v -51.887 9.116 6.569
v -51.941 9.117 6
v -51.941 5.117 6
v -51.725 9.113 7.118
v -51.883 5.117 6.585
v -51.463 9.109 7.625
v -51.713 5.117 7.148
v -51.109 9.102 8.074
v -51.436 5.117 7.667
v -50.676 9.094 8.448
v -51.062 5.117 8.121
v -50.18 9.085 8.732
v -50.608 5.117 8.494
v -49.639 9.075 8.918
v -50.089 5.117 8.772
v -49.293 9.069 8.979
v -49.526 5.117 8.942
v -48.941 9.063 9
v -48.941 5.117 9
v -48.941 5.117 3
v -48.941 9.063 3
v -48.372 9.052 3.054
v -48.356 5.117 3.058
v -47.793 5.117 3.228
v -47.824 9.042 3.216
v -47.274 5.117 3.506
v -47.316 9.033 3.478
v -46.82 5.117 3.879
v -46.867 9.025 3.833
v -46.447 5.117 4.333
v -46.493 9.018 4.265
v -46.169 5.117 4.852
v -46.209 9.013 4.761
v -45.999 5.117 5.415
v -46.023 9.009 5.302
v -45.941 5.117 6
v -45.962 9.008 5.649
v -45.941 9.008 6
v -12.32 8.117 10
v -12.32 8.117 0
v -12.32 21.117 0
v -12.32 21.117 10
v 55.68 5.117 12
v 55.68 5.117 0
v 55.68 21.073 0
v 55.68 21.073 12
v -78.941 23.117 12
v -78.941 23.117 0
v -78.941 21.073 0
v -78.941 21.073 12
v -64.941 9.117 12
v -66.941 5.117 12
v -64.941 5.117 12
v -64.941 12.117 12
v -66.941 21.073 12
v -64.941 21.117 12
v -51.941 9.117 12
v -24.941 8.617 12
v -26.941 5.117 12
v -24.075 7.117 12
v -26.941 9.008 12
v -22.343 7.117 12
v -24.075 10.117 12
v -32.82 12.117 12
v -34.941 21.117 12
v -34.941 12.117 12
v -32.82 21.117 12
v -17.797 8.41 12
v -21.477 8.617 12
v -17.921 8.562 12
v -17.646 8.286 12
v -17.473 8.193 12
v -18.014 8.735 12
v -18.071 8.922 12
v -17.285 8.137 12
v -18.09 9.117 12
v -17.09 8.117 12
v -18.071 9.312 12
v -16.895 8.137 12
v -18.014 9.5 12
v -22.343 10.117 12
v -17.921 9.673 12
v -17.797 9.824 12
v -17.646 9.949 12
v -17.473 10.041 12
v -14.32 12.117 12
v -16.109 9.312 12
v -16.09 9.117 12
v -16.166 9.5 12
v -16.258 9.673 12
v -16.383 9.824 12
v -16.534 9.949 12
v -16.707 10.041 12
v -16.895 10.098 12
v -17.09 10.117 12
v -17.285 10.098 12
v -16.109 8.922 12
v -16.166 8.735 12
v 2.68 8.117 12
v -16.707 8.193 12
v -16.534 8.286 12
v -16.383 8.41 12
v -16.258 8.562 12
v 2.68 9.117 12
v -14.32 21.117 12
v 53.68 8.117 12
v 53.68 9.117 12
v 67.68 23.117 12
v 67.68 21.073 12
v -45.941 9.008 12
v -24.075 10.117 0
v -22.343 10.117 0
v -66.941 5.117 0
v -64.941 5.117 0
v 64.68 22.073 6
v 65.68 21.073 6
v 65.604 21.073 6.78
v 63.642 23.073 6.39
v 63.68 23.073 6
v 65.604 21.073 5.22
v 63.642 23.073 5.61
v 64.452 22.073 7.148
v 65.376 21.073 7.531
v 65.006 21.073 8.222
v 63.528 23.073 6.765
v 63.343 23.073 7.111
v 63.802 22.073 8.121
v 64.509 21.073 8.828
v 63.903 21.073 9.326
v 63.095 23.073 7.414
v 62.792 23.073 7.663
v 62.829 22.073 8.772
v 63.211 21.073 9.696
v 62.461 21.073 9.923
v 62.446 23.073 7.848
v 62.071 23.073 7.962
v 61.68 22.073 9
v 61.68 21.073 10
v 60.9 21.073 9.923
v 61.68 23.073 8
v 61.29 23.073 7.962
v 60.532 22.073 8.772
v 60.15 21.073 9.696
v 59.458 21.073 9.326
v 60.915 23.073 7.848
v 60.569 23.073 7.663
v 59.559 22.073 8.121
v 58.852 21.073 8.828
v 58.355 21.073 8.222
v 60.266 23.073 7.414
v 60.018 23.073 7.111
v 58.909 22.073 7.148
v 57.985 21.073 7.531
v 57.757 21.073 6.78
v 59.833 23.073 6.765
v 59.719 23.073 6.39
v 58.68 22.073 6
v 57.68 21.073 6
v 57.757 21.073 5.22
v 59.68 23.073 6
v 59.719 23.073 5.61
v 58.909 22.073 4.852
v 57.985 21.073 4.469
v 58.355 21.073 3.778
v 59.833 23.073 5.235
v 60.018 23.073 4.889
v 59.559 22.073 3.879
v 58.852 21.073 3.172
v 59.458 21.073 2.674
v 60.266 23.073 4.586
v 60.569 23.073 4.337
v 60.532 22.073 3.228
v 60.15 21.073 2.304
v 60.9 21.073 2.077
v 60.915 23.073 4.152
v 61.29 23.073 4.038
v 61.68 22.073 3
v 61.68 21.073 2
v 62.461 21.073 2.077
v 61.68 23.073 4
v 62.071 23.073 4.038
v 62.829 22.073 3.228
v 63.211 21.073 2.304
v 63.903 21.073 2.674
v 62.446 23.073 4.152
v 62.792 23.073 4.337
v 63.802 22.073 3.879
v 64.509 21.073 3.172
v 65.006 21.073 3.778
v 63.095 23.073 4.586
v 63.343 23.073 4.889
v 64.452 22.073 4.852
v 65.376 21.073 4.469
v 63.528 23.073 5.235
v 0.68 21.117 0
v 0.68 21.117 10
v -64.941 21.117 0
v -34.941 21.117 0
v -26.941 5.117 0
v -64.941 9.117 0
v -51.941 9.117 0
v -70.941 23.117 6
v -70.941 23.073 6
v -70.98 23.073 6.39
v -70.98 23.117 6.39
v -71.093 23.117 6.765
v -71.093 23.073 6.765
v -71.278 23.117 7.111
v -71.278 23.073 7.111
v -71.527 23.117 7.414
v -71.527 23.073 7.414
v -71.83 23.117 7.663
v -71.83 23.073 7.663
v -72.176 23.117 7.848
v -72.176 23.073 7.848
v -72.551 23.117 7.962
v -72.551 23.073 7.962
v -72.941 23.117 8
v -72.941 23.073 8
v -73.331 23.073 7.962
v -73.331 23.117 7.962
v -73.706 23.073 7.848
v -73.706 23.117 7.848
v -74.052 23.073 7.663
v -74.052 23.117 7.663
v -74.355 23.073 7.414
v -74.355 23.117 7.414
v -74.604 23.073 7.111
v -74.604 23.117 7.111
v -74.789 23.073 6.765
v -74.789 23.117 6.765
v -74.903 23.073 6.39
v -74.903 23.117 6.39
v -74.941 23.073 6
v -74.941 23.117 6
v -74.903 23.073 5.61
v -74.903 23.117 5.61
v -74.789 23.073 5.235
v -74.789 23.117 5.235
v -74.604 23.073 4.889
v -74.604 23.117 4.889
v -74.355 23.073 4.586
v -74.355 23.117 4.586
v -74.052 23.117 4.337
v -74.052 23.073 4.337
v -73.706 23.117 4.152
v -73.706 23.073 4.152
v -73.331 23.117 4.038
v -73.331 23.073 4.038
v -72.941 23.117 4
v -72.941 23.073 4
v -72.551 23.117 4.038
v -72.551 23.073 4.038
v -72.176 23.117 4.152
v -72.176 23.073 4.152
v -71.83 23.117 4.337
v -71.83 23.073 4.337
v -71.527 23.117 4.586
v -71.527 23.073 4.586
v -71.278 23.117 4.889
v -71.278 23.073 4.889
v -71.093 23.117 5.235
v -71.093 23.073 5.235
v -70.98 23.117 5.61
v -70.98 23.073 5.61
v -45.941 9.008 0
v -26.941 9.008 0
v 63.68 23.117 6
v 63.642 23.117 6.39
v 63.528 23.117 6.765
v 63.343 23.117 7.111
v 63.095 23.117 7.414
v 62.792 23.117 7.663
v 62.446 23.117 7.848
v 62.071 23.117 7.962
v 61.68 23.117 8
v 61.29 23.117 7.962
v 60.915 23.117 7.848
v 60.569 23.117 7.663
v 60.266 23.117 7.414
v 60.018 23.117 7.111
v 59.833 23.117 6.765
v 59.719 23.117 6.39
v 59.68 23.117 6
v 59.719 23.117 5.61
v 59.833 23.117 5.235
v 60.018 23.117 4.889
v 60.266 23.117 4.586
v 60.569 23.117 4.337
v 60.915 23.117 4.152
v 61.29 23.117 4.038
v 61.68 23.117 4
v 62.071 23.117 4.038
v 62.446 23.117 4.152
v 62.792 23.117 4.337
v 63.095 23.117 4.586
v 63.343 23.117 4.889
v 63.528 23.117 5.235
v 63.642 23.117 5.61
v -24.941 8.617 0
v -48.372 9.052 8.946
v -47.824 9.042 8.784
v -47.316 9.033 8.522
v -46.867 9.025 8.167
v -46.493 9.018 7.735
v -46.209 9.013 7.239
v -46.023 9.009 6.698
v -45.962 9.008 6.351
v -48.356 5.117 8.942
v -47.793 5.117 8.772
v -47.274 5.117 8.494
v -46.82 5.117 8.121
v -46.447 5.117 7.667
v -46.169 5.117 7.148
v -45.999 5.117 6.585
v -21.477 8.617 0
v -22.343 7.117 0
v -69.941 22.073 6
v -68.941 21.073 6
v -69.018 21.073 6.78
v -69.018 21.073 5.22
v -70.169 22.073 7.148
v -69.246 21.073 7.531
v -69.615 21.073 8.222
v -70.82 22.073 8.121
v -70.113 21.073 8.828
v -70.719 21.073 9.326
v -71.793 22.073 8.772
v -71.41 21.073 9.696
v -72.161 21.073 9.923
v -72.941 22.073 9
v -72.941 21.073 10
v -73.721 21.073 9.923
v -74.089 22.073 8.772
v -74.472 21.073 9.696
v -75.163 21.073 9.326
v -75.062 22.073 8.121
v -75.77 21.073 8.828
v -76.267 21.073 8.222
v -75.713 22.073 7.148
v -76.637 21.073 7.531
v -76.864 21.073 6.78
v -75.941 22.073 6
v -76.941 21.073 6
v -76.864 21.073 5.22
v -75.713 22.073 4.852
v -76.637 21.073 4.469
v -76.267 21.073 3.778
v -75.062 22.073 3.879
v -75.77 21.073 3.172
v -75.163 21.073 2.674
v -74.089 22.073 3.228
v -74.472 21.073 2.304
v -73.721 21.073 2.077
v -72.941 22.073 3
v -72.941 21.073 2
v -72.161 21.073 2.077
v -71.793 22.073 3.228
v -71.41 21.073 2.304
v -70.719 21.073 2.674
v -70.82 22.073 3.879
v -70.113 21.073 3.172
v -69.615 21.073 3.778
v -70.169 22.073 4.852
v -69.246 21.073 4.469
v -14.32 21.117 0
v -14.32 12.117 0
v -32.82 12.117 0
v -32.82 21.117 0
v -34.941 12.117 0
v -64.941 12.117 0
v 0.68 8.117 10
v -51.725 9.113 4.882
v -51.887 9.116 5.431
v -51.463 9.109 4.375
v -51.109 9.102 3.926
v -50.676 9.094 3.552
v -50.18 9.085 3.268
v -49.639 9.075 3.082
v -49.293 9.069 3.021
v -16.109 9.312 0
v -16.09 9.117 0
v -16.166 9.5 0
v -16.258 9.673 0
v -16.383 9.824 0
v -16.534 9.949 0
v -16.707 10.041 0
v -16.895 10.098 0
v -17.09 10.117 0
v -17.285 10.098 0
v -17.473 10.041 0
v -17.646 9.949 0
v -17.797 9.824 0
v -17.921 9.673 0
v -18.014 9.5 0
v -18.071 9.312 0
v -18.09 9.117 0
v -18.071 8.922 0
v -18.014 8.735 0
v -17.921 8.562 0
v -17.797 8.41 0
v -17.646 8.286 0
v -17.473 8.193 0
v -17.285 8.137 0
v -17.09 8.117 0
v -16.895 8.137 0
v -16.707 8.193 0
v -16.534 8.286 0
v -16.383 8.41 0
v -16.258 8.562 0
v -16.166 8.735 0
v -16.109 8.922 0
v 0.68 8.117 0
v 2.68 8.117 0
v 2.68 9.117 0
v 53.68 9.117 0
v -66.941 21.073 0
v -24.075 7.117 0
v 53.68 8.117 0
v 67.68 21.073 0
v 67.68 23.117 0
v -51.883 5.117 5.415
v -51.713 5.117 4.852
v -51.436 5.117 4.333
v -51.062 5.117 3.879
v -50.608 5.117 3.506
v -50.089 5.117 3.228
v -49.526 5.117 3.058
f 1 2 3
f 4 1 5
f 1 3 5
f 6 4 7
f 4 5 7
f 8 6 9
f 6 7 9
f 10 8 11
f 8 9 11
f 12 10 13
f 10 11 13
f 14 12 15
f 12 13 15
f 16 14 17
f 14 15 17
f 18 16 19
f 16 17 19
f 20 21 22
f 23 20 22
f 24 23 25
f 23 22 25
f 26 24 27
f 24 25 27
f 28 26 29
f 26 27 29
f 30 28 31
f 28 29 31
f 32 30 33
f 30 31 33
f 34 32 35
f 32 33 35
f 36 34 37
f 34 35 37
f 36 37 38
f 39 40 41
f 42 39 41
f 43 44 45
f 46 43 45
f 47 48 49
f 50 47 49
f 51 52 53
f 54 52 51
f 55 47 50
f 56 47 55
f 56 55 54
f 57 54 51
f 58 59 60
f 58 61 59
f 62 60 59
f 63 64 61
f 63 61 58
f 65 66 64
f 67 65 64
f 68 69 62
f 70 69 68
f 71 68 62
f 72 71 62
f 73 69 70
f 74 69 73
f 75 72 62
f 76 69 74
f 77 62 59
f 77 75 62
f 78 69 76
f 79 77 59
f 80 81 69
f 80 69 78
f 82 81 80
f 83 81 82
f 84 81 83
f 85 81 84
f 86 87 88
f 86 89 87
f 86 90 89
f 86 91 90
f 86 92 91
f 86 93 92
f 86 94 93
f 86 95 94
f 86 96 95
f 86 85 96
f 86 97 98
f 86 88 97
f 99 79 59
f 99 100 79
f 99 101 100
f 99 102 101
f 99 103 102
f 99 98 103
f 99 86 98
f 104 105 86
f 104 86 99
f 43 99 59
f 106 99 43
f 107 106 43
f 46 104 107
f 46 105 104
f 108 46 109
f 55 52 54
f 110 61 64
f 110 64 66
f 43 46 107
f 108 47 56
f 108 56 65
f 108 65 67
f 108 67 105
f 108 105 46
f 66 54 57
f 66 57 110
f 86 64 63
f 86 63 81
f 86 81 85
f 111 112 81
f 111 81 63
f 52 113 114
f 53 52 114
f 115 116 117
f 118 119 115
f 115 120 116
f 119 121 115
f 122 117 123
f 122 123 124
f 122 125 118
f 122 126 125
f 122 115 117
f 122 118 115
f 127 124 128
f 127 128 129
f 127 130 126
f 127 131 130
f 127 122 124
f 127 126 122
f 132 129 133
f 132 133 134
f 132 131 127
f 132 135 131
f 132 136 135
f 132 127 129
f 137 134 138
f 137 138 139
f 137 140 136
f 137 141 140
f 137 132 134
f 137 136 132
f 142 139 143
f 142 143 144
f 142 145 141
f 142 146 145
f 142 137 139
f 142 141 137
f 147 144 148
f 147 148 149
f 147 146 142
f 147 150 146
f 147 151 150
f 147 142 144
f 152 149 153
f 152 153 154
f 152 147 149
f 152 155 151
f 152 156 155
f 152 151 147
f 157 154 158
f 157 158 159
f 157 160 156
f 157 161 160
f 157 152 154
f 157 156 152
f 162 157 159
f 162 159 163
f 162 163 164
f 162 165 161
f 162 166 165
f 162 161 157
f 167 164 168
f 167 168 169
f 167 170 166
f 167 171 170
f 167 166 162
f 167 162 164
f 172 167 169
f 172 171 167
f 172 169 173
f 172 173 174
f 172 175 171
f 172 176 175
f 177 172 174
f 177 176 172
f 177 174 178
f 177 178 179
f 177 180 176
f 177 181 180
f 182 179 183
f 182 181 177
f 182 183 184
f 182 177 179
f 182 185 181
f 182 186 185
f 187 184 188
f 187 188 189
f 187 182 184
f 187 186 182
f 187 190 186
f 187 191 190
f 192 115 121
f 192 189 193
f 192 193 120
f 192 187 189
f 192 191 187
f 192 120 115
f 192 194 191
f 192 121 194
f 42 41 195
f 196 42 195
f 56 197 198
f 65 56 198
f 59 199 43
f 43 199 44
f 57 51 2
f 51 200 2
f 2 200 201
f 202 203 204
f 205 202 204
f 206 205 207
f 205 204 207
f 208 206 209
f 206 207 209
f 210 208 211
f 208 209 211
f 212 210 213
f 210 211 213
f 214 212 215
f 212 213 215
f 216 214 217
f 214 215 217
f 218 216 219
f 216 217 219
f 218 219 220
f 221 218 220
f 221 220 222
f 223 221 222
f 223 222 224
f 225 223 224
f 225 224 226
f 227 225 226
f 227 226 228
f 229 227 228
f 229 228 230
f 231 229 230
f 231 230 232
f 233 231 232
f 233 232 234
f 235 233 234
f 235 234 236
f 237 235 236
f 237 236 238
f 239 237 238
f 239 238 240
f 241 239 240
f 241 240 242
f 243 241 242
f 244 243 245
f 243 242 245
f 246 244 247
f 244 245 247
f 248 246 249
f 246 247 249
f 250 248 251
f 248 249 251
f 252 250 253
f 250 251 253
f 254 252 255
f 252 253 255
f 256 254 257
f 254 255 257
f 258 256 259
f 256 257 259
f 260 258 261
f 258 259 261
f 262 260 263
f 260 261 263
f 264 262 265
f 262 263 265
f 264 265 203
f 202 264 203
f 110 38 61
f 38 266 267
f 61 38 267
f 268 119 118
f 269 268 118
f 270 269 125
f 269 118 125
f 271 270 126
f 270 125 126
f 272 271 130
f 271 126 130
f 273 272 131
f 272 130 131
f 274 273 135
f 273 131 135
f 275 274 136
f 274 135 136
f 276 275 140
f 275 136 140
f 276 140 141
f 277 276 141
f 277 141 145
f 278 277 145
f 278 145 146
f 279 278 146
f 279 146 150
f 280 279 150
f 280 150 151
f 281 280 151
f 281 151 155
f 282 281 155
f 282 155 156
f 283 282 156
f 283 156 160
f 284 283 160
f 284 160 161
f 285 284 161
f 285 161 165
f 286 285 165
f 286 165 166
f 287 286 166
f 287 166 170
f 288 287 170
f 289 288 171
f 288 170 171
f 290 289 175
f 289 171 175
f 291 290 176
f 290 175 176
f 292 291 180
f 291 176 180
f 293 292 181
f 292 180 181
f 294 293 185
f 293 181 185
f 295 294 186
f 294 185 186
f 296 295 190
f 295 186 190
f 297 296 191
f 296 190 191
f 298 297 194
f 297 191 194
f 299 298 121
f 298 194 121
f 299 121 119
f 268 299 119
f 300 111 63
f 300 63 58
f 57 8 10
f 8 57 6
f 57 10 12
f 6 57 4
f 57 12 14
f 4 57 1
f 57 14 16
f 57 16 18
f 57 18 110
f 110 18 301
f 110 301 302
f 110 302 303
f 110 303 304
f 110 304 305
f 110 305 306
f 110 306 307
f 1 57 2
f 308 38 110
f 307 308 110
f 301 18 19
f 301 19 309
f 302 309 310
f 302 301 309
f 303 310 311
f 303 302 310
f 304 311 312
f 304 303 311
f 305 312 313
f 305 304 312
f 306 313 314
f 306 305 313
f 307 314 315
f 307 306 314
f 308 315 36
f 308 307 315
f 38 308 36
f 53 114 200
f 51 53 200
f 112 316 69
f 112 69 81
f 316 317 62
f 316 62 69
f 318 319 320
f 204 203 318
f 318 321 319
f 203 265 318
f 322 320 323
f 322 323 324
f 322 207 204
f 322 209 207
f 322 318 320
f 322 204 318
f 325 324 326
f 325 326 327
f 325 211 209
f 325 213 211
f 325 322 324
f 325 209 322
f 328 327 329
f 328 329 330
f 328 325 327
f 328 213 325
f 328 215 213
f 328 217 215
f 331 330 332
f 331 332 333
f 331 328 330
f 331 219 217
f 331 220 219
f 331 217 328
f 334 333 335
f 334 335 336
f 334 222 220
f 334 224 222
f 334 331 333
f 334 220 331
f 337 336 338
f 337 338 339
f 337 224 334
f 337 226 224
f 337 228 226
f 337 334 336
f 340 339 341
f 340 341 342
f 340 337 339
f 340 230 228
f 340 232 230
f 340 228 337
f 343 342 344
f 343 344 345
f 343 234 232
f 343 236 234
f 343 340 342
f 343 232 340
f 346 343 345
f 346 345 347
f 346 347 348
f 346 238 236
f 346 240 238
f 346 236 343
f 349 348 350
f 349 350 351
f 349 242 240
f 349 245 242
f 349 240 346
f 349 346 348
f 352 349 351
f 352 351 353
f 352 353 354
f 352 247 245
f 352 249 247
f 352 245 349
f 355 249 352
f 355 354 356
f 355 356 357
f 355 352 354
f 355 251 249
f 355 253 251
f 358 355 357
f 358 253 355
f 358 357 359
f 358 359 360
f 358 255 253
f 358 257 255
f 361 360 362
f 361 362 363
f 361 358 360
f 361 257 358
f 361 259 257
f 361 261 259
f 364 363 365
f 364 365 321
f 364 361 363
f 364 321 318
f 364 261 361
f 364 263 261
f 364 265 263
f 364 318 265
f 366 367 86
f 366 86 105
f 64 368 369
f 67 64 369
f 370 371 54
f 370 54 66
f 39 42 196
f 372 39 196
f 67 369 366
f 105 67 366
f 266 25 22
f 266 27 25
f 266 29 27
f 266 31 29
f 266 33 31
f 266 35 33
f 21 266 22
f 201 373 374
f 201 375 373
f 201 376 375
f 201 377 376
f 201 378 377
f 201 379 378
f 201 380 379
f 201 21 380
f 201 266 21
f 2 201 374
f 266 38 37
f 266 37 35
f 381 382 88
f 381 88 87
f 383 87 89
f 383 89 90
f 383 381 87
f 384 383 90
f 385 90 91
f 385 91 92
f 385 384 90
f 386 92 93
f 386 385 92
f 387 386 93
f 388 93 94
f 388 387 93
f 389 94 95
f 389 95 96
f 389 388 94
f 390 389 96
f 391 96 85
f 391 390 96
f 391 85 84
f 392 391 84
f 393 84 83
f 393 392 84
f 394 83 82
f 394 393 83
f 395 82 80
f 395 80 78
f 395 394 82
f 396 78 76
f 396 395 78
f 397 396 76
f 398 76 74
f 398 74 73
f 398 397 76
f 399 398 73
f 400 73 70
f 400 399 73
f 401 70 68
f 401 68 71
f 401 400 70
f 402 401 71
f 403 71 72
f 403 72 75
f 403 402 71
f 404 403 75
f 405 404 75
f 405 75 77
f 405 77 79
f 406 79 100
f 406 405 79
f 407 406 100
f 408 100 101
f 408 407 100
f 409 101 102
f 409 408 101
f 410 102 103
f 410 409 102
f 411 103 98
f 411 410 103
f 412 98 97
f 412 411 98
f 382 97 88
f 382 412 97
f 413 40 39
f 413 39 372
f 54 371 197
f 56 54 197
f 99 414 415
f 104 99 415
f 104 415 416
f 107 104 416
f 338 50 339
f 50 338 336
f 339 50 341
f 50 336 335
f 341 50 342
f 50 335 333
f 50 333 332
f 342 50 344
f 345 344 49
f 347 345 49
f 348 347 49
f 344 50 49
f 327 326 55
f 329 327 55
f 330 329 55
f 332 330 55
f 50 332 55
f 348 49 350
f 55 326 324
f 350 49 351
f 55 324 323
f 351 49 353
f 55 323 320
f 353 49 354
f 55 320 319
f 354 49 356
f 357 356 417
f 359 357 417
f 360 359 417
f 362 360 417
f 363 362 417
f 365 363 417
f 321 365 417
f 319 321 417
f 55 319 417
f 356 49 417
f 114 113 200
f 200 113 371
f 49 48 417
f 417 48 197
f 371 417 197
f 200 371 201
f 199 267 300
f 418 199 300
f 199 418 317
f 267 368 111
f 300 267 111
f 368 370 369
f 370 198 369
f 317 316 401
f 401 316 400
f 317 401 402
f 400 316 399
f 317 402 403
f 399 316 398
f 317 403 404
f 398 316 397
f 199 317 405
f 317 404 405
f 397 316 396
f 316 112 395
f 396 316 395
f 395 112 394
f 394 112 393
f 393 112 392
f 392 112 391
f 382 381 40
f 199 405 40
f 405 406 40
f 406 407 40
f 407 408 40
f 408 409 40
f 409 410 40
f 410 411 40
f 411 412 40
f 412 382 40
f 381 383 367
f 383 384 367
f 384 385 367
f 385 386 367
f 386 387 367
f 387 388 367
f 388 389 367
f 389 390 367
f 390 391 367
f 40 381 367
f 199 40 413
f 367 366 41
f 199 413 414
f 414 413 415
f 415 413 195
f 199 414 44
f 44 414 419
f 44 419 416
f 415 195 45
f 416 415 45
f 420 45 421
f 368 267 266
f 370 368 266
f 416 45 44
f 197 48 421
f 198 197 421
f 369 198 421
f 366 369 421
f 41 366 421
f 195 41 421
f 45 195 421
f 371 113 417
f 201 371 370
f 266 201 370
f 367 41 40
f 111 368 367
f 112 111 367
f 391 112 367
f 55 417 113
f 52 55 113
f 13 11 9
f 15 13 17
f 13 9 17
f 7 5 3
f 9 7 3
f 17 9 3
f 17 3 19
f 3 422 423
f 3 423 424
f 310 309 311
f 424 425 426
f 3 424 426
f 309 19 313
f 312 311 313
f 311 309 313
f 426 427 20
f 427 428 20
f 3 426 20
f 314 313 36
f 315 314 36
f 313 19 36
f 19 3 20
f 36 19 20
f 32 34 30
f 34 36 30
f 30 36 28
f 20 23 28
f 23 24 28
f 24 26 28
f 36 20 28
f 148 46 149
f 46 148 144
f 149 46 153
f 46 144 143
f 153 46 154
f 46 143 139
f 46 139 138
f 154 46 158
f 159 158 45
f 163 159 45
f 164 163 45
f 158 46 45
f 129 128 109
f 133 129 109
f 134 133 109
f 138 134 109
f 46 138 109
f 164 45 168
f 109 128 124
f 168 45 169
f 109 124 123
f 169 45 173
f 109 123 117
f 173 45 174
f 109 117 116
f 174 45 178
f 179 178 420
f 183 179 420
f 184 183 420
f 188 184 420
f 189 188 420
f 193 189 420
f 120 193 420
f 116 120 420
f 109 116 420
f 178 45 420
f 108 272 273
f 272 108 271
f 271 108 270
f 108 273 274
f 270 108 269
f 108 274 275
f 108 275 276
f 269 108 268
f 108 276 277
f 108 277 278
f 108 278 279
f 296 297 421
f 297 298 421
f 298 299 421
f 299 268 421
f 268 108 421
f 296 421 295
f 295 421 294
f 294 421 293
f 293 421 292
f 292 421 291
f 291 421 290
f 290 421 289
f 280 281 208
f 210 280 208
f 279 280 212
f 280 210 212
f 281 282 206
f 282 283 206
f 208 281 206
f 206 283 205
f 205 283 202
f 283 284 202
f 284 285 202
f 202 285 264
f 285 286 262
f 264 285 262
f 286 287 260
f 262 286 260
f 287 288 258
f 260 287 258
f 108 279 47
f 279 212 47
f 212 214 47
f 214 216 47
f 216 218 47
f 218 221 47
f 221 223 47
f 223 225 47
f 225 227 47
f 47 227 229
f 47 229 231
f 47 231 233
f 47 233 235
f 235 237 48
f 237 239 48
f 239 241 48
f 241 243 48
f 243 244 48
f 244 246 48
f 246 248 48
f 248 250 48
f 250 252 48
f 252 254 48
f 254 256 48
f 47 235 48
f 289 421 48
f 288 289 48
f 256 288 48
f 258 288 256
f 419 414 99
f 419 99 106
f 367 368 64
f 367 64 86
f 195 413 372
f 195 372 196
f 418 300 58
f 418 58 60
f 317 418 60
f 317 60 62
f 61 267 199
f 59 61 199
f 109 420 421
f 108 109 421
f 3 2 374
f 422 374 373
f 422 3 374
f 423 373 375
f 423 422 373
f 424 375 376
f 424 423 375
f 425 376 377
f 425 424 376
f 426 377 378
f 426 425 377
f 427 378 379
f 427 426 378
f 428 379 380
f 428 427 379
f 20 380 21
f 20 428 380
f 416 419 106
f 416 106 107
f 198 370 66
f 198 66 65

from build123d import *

# Parameters (mm, degrees)
F7_DEPTH  = 12
F3_W      = 18.5
F3_H      = 9
F5_R      = 1
F2_W      = 30
F2_H      = 9
F0_W      = 51
F0_H      = 1
F8_DEPTH  = 12
F9_DEPTH  = 9
F10_DEPTH = 3
F11_R     = 2.99999
F13_R     = 2
F12_R     = 2
F14_DEPTH = 23.9
F15_SIZE  = 2
F1_W      = 13
F1_H      = 13
F16_DEPTH = 10


# Not quite as in the source:
# - a fillet or chamfer is up to 0.001 mm smaller than in the source, because OpenCascade refuses the exact size


with BuildPart() as f7:
    # F6 (on Top) → F7 (new body)
    with BuildSketch(Plane.XY):
        Polygon((58.3547055721, 23.1172949925), (-78.9411039278, 23.1172949925), (-78.9411039278, 21.0728161037), (-66.9411039278, 21.0728161037), (-66.9411039278, 5.1172949925), (-64.9411039278, 5.1172949925), (-64.9411039278, 9.1172949925), (-51.9411039278, 9.1172949925), (-45.9411039278, 9.0077459167), (-26.9411039278, 9.0077459167), (-26.9411039278, 5.1172949925), (55.6804920286, 5.1172949925), (55.6804920286, 21.0728161037), (67.6804920286, 21.0728161037), (67.6804920286, 23.1172949925), align=None)
    extrude(amount=F7_DEPTH)

    # F4 (on Top) + F3 (on Top) + F5 (on Top) + F2 (on Top) + F0 (on Top) → F8 (cut)
    with BuildSketch(Plane.XY):
        Polygon((-22.3430277164, 7.1172949925), (-21.4770023127, 8.6172949925), (-22.3430277164, 10.1172949925), (-24.075078524, 10.1172949925), (-24.9411039278, 8.6172949925), (-24.075078524, 7.1172949925), align=None)
    with BuildSketch(Plane.XY):
        with Locations((-23.5695079714, 16.6172949925)):
            Rectangle(F3_W, F3_H)
    with BuildSketch(Plane.XY):
        with Locations((-17.0899687546, 9.1172949925)):
            Circle(F5_R)
    with BuildSketch(Plane.XY):
        with Locations((-49.9411039278, 16.6172949925)):
            Rectangle(F2_W, F2_H)
    with BuildSketch(Plane.XY):
        with Locations((28.1804920286, 8.6172949925)):
            Rectangle(F0_W, F0_H)
    extrude(amount=F8_DEPTH, mode=Mode.SUBTRACT)

    # F6 (on Top) → F9 (join)
    with BuildSketch(Plane.XY):
        Polygon((-51.9411039278, 9.1172949925), (-51.9411039278, 5.1172949925), (-45.9411039278, 5.1172949925), (-45.9411039278, 9.0077459167), align=None)
    extrude(amount=F9_DEPTH)

    # F6 (on Top) → F10 (cut)
    with BuildSketch(Plane.XY):
        Polygon((-51.9411039278, 9.1172949925), (-51.9411039278, 5.1172949925), (-45.9411039278, 5.1172949925), (-45.9411039278, 9.0077459167), align=None)
    extrude(amount=F10_DEPTH, mode=Mode.SUBTRACT)

    # F11 (radius 3 in the source; OpenCascade refuses exactly that, so slightly less here)
    f11_edges = [f7.edges().sort_by_distance(p)[0] for p in [
        (-51.941104, 7.117295, 9),
        (-45.941104, 7.06252, 9),
        (-51.941104, 7.117295, 3),
        (-45.941104, 7.06252, 3),
    ]]
    fillet(f11_edges, radius=F11_R)

    # F13 (on Front) + F12 (on Front) → F14 (cut)
    with BuildSketch(Plane.XZ):
        with Locations((-72.9411039278, 6)):
            Circle(F13_R)
    with BuildSketch(Plane.XZ):
        with Locations((61.6804920286, 6)):
            Circle(F12_R)
    extrude(amount=-F14_DEPTH, mode=Mode.SUBTRACT)

    # F15
    f15_edges = [f7.edges().sort_by_distance(p)[0] for p in [
        (-74.941104, 21.072816, 6),
        (59.680492, 21.072816, 6),
    ]]
    chamfer(f15_edges, length=F15_SIZE)

    # F1 (on Top) → F16 (cut)
    with BuildSketch(Plane.XY):
        with Locations((-5.8195079714, 14.6172949925)):
            Rectangle(F1_W, F1_H)
    extrude(amount=F16_DEPTH, mode=Mode.SUBTRACT)


solid = f7.part
